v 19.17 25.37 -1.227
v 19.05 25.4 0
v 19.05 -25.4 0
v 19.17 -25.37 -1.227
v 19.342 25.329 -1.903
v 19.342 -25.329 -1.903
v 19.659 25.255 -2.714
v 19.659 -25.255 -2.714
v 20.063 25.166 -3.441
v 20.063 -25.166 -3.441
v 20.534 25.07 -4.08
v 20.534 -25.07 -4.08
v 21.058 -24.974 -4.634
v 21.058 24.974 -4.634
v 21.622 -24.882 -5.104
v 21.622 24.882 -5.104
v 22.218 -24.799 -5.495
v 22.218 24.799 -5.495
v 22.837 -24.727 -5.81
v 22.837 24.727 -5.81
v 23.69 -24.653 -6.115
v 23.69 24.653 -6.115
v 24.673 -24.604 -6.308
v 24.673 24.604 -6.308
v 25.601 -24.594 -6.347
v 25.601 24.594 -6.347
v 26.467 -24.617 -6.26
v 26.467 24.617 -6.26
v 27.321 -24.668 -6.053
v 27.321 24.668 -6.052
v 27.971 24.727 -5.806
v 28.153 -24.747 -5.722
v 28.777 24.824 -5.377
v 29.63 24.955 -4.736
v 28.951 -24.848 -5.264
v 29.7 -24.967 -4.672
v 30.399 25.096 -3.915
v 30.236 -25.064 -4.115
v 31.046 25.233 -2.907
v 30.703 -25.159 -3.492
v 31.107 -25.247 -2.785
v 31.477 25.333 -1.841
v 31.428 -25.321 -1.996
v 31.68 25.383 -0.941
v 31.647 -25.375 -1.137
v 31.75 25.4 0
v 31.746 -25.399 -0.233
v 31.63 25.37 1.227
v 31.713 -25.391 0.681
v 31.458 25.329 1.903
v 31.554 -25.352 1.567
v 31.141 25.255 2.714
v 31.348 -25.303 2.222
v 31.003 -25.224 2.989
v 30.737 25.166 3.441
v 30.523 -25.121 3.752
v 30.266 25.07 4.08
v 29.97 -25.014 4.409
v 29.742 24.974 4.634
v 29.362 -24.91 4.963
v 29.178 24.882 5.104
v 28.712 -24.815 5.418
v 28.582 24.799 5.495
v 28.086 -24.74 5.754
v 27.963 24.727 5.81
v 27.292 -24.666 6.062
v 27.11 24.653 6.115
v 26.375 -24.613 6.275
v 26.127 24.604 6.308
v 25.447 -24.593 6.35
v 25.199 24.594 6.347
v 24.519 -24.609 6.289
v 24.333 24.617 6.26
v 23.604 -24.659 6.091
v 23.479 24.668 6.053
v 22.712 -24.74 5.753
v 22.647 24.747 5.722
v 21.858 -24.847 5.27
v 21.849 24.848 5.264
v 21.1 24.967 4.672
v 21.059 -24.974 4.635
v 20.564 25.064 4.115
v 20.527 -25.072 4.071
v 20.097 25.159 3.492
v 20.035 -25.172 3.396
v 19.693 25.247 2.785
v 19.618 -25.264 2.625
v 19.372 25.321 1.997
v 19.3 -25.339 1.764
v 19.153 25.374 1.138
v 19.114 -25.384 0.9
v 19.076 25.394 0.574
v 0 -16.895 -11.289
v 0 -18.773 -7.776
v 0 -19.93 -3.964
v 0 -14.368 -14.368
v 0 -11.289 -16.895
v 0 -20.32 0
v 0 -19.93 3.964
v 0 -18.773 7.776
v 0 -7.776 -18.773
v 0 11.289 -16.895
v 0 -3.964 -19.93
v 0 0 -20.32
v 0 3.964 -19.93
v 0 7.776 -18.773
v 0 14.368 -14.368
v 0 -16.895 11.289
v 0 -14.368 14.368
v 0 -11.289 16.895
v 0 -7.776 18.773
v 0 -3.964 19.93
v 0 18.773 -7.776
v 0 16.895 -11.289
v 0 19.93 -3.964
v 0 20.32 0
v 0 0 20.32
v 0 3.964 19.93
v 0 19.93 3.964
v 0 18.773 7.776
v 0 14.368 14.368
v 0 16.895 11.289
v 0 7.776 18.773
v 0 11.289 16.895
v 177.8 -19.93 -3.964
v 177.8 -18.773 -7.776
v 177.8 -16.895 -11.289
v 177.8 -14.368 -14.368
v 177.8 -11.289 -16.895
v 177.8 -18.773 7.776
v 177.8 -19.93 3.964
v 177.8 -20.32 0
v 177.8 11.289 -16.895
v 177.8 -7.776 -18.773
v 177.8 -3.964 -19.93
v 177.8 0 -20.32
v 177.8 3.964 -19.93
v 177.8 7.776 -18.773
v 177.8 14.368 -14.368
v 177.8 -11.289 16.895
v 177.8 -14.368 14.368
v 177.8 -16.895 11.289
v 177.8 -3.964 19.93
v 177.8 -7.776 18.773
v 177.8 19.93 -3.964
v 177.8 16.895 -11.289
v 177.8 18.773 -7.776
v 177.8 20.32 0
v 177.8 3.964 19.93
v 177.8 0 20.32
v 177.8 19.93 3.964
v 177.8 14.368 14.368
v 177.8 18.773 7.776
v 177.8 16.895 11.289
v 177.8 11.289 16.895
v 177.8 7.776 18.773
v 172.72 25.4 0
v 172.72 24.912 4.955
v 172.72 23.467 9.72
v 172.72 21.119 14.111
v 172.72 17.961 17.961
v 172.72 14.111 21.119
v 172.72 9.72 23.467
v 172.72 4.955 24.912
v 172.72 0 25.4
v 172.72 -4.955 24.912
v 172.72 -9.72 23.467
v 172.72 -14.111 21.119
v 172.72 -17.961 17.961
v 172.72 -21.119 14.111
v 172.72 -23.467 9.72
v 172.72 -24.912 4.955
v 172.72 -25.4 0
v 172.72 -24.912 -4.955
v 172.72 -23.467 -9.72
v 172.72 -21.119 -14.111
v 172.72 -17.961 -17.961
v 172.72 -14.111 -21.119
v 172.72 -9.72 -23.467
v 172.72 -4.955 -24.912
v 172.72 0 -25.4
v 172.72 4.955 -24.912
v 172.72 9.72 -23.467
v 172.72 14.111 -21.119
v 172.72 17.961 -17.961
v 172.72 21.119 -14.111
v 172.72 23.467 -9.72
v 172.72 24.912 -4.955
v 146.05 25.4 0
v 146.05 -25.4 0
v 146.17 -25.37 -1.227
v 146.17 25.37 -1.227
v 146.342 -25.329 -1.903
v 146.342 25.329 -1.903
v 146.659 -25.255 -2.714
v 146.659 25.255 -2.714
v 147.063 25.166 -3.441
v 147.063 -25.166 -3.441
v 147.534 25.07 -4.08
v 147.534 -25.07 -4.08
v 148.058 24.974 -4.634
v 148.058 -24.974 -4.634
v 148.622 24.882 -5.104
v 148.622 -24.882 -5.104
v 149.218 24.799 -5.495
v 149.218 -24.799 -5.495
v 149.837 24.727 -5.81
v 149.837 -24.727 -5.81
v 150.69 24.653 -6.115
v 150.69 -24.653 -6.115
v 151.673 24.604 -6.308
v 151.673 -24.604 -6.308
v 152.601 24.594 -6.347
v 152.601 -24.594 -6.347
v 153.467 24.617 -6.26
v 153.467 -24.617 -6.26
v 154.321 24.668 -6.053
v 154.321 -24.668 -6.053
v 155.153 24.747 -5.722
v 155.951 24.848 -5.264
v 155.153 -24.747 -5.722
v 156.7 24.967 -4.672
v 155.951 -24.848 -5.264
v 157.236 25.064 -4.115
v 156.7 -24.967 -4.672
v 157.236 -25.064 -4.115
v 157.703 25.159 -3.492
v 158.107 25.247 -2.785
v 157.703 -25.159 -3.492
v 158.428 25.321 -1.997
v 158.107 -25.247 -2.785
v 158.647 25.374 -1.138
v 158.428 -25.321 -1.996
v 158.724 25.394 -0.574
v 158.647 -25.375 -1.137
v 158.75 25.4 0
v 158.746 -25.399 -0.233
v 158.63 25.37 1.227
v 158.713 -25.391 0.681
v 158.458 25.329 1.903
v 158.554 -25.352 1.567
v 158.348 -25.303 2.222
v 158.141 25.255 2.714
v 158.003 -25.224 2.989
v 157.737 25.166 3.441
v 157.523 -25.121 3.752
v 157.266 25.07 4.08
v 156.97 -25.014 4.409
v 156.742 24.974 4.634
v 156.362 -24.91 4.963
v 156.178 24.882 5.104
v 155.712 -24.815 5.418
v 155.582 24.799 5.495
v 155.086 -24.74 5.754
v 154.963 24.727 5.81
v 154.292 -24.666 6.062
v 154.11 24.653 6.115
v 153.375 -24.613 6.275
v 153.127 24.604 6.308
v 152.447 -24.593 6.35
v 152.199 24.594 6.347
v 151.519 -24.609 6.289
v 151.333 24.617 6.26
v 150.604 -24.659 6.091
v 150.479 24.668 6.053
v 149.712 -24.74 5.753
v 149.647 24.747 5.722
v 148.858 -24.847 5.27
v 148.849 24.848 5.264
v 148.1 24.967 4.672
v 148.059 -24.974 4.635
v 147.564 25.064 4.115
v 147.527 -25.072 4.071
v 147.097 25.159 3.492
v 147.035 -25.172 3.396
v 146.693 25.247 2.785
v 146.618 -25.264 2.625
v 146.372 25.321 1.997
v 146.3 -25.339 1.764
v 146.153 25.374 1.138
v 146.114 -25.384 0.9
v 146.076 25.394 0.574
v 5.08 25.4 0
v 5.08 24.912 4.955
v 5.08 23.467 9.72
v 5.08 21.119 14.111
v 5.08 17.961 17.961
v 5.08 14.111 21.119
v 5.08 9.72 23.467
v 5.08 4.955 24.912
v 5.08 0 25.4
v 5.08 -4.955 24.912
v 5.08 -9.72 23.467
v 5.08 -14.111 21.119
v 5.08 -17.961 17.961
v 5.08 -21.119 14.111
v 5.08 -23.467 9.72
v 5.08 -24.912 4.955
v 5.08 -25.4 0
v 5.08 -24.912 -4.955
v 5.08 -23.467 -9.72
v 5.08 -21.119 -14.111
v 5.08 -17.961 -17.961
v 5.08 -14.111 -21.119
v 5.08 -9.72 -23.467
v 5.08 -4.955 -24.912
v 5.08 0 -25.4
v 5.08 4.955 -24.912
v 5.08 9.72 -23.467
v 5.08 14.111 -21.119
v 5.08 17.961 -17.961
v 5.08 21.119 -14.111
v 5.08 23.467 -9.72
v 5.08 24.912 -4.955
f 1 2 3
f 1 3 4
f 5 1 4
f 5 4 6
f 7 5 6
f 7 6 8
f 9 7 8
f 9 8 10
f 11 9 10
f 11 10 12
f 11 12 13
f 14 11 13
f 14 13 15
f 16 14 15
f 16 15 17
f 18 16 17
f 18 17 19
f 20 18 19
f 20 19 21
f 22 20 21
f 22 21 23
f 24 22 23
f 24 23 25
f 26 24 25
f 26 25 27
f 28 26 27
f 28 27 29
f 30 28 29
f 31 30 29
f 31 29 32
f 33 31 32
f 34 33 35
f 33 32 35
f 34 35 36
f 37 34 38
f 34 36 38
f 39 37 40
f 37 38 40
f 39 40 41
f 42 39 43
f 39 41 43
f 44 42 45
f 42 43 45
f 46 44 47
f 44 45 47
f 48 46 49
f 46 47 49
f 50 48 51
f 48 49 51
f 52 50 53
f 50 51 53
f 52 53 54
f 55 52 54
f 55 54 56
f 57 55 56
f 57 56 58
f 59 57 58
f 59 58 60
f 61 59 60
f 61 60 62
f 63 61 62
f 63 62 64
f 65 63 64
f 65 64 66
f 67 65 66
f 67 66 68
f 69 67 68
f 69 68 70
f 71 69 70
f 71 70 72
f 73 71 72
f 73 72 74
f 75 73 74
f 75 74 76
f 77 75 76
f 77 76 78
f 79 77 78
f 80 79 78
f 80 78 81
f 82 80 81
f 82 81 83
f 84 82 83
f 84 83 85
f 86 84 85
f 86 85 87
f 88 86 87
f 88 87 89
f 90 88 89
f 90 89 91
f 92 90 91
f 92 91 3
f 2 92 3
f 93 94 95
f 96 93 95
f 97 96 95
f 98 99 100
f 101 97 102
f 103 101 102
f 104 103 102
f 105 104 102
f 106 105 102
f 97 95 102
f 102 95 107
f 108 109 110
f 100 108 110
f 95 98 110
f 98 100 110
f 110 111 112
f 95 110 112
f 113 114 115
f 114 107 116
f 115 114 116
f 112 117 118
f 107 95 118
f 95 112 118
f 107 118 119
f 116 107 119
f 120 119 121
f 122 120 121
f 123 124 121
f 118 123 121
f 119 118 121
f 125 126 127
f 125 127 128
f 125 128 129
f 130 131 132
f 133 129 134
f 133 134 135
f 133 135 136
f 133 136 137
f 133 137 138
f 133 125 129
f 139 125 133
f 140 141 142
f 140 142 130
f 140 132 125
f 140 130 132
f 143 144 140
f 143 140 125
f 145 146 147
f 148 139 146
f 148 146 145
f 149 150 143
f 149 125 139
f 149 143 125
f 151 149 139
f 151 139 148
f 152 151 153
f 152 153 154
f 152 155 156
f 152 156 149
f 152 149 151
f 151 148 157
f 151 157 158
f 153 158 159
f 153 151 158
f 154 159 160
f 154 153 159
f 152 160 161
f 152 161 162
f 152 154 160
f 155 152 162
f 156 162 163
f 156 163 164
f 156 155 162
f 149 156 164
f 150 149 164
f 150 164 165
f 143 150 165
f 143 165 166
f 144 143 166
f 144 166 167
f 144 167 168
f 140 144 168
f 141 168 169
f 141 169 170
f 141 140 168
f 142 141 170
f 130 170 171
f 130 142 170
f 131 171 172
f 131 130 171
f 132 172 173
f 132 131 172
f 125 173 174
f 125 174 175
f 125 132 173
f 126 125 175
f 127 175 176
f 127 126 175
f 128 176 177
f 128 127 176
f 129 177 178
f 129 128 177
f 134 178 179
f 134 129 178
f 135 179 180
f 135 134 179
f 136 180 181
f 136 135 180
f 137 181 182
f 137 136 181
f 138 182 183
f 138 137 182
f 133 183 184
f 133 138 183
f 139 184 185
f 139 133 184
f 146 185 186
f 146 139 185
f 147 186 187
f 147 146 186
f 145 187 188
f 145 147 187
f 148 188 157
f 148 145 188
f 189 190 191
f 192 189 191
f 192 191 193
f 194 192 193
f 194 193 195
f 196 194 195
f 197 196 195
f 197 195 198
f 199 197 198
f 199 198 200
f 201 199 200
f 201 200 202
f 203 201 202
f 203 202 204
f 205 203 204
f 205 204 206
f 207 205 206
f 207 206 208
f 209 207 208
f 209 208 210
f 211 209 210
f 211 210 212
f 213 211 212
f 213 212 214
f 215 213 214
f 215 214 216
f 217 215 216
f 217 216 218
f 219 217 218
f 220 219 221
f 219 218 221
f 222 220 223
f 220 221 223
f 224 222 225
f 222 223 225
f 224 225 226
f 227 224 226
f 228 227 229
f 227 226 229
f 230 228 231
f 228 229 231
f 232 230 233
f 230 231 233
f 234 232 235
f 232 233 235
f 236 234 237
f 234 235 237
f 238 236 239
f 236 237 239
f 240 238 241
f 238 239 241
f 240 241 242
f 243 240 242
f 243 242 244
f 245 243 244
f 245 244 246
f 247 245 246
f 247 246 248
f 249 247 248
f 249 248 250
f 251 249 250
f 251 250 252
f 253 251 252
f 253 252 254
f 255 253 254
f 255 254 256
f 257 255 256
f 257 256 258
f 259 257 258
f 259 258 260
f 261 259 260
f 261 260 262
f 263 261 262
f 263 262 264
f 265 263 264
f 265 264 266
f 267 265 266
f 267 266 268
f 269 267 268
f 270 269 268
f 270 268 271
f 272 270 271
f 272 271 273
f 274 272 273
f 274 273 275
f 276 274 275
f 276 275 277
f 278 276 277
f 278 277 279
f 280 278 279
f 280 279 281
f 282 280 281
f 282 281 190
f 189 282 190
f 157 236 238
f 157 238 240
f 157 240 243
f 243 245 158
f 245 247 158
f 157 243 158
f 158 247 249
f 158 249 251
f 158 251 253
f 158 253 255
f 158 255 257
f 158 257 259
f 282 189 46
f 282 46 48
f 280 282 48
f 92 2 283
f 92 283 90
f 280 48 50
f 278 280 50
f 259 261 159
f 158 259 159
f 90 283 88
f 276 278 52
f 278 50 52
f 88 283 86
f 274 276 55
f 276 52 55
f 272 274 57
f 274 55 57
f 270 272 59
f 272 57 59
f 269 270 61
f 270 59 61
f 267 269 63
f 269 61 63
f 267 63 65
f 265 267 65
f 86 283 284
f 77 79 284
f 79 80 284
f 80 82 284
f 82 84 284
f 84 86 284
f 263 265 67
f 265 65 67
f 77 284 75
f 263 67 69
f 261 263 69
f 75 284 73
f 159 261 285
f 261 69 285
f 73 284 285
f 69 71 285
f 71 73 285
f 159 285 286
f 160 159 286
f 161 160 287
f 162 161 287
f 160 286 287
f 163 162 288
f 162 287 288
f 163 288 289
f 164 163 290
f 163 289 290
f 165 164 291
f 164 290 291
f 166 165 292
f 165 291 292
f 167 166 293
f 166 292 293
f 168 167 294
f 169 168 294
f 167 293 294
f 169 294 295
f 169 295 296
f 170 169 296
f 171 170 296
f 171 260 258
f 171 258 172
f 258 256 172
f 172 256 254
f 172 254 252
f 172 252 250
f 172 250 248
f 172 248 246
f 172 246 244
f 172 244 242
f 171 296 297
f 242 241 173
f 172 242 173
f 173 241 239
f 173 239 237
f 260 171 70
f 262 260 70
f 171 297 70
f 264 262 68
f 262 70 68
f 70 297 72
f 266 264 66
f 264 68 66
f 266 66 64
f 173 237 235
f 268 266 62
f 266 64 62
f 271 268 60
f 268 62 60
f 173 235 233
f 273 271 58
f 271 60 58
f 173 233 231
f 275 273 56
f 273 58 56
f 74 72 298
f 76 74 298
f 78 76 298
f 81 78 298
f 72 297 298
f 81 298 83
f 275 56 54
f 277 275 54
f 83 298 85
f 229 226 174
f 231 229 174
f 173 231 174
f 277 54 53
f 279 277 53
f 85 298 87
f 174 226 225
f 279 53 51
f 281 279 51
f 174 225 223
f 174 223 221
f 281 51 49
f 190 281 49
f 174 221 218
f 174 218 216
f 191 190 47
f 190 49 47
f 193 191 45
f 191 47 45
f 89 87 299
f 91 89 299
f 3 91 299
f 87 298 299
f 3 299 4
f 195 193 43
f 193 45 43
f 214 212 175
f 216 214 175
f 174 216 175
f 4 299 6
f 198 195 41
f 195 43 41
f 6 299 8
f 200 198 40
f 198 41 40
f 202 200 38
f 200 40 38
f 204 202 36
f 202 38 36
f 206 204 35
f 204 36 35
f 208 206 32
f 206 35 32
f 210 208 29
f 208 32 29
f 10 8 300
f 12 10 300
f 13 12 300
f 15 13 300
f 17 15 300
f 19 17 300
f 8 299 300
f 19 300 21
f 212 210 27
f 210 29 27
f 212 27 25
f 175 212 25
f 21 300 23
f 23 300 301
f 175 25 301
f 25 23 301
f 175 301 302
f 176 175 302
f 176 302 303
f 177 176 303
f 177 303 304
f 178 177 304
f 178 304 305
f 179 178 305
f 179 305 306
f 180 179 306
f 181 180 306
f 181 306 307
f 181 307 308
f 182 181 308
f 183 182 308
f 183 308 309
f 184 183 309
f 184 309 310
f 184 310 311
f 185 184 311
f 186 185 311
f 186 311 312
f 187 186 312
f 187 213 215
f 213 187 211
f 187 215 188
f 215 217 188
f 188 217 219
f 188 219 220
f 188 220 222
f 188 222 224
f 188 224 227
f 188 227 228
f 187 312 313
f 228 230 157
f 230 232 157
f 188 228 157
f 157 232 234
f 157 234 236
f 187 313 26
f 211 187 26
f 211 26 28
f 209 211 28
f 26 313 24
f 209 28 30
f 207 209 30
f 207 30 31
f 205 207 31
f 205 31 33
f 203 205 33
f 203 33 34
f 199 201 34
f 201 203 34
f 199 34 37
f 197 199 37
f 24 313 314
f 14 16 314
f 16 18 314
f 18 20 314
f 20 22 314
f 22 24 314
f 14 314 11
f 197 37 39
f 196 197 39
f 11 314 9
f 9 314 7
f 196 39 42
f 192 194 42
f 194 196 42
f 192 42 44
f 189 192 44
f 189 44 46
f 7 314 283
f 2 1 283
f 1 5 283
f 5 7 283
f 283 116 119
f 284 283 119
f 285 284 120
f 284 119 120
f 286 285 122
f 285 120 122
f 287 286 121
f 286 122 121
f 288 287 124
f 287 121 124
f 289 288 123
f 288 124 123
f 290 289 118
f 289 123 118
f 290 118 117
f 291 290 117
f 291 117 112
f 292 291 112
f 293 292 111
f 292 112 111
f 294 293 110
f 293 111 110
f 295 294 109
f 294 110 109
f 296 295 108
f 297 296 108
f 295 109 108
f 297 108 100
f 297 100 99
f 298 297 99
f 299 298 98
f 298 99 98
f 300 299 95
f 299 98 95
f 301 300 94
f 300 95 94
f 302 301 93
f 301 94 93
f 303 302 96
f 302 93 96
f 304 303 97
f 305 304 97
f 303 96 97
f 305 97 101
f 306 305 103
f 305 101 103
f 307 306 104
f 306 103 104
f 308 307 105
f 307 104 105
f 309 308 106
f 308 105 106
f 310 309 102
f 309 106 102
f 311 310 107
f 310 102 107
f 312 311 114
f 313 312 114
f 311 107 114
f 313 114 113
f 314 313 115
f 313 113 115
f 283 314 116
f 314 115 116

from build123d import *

# Parameters (mm, degrees)
F0_R     = 25.4
F1_DEPTH = 177.8
F2_SIZE  = 5.08
F4_D     = 12.7
F5_D     = 12.7


with BuildPart() as f1:
    # F0 (on Right) → F1 (new body)
    with BuildSketch(Plane.YZ):
        Circle(F0_R)
    extrude(amount=F1_DEPTH)

    # F2
    f2_edges = [f1.edges().sort_by_distance(p)[0] for p in [
        (0, -25.4, 0),
        (177.8, -25.4, 0),
    ]]
    chamfer(f2_edges, length=F2_SIZE)

    # F4 (through all)
    with Locations(Plane(origin=(0, 0, 0), x_dir=(1, 0, 0), z_dir=(0, 1, 0))):
        with Locations((152.4, 0), (25.4, 0)):
            Hole(F4_D / 2)

    # F5 (through all)
    with Locations(Plane.XZ):
        with Locations((25.4, 0), (152.4, 0)):
            Hole(F5_D / 2)


solid = f1.part
